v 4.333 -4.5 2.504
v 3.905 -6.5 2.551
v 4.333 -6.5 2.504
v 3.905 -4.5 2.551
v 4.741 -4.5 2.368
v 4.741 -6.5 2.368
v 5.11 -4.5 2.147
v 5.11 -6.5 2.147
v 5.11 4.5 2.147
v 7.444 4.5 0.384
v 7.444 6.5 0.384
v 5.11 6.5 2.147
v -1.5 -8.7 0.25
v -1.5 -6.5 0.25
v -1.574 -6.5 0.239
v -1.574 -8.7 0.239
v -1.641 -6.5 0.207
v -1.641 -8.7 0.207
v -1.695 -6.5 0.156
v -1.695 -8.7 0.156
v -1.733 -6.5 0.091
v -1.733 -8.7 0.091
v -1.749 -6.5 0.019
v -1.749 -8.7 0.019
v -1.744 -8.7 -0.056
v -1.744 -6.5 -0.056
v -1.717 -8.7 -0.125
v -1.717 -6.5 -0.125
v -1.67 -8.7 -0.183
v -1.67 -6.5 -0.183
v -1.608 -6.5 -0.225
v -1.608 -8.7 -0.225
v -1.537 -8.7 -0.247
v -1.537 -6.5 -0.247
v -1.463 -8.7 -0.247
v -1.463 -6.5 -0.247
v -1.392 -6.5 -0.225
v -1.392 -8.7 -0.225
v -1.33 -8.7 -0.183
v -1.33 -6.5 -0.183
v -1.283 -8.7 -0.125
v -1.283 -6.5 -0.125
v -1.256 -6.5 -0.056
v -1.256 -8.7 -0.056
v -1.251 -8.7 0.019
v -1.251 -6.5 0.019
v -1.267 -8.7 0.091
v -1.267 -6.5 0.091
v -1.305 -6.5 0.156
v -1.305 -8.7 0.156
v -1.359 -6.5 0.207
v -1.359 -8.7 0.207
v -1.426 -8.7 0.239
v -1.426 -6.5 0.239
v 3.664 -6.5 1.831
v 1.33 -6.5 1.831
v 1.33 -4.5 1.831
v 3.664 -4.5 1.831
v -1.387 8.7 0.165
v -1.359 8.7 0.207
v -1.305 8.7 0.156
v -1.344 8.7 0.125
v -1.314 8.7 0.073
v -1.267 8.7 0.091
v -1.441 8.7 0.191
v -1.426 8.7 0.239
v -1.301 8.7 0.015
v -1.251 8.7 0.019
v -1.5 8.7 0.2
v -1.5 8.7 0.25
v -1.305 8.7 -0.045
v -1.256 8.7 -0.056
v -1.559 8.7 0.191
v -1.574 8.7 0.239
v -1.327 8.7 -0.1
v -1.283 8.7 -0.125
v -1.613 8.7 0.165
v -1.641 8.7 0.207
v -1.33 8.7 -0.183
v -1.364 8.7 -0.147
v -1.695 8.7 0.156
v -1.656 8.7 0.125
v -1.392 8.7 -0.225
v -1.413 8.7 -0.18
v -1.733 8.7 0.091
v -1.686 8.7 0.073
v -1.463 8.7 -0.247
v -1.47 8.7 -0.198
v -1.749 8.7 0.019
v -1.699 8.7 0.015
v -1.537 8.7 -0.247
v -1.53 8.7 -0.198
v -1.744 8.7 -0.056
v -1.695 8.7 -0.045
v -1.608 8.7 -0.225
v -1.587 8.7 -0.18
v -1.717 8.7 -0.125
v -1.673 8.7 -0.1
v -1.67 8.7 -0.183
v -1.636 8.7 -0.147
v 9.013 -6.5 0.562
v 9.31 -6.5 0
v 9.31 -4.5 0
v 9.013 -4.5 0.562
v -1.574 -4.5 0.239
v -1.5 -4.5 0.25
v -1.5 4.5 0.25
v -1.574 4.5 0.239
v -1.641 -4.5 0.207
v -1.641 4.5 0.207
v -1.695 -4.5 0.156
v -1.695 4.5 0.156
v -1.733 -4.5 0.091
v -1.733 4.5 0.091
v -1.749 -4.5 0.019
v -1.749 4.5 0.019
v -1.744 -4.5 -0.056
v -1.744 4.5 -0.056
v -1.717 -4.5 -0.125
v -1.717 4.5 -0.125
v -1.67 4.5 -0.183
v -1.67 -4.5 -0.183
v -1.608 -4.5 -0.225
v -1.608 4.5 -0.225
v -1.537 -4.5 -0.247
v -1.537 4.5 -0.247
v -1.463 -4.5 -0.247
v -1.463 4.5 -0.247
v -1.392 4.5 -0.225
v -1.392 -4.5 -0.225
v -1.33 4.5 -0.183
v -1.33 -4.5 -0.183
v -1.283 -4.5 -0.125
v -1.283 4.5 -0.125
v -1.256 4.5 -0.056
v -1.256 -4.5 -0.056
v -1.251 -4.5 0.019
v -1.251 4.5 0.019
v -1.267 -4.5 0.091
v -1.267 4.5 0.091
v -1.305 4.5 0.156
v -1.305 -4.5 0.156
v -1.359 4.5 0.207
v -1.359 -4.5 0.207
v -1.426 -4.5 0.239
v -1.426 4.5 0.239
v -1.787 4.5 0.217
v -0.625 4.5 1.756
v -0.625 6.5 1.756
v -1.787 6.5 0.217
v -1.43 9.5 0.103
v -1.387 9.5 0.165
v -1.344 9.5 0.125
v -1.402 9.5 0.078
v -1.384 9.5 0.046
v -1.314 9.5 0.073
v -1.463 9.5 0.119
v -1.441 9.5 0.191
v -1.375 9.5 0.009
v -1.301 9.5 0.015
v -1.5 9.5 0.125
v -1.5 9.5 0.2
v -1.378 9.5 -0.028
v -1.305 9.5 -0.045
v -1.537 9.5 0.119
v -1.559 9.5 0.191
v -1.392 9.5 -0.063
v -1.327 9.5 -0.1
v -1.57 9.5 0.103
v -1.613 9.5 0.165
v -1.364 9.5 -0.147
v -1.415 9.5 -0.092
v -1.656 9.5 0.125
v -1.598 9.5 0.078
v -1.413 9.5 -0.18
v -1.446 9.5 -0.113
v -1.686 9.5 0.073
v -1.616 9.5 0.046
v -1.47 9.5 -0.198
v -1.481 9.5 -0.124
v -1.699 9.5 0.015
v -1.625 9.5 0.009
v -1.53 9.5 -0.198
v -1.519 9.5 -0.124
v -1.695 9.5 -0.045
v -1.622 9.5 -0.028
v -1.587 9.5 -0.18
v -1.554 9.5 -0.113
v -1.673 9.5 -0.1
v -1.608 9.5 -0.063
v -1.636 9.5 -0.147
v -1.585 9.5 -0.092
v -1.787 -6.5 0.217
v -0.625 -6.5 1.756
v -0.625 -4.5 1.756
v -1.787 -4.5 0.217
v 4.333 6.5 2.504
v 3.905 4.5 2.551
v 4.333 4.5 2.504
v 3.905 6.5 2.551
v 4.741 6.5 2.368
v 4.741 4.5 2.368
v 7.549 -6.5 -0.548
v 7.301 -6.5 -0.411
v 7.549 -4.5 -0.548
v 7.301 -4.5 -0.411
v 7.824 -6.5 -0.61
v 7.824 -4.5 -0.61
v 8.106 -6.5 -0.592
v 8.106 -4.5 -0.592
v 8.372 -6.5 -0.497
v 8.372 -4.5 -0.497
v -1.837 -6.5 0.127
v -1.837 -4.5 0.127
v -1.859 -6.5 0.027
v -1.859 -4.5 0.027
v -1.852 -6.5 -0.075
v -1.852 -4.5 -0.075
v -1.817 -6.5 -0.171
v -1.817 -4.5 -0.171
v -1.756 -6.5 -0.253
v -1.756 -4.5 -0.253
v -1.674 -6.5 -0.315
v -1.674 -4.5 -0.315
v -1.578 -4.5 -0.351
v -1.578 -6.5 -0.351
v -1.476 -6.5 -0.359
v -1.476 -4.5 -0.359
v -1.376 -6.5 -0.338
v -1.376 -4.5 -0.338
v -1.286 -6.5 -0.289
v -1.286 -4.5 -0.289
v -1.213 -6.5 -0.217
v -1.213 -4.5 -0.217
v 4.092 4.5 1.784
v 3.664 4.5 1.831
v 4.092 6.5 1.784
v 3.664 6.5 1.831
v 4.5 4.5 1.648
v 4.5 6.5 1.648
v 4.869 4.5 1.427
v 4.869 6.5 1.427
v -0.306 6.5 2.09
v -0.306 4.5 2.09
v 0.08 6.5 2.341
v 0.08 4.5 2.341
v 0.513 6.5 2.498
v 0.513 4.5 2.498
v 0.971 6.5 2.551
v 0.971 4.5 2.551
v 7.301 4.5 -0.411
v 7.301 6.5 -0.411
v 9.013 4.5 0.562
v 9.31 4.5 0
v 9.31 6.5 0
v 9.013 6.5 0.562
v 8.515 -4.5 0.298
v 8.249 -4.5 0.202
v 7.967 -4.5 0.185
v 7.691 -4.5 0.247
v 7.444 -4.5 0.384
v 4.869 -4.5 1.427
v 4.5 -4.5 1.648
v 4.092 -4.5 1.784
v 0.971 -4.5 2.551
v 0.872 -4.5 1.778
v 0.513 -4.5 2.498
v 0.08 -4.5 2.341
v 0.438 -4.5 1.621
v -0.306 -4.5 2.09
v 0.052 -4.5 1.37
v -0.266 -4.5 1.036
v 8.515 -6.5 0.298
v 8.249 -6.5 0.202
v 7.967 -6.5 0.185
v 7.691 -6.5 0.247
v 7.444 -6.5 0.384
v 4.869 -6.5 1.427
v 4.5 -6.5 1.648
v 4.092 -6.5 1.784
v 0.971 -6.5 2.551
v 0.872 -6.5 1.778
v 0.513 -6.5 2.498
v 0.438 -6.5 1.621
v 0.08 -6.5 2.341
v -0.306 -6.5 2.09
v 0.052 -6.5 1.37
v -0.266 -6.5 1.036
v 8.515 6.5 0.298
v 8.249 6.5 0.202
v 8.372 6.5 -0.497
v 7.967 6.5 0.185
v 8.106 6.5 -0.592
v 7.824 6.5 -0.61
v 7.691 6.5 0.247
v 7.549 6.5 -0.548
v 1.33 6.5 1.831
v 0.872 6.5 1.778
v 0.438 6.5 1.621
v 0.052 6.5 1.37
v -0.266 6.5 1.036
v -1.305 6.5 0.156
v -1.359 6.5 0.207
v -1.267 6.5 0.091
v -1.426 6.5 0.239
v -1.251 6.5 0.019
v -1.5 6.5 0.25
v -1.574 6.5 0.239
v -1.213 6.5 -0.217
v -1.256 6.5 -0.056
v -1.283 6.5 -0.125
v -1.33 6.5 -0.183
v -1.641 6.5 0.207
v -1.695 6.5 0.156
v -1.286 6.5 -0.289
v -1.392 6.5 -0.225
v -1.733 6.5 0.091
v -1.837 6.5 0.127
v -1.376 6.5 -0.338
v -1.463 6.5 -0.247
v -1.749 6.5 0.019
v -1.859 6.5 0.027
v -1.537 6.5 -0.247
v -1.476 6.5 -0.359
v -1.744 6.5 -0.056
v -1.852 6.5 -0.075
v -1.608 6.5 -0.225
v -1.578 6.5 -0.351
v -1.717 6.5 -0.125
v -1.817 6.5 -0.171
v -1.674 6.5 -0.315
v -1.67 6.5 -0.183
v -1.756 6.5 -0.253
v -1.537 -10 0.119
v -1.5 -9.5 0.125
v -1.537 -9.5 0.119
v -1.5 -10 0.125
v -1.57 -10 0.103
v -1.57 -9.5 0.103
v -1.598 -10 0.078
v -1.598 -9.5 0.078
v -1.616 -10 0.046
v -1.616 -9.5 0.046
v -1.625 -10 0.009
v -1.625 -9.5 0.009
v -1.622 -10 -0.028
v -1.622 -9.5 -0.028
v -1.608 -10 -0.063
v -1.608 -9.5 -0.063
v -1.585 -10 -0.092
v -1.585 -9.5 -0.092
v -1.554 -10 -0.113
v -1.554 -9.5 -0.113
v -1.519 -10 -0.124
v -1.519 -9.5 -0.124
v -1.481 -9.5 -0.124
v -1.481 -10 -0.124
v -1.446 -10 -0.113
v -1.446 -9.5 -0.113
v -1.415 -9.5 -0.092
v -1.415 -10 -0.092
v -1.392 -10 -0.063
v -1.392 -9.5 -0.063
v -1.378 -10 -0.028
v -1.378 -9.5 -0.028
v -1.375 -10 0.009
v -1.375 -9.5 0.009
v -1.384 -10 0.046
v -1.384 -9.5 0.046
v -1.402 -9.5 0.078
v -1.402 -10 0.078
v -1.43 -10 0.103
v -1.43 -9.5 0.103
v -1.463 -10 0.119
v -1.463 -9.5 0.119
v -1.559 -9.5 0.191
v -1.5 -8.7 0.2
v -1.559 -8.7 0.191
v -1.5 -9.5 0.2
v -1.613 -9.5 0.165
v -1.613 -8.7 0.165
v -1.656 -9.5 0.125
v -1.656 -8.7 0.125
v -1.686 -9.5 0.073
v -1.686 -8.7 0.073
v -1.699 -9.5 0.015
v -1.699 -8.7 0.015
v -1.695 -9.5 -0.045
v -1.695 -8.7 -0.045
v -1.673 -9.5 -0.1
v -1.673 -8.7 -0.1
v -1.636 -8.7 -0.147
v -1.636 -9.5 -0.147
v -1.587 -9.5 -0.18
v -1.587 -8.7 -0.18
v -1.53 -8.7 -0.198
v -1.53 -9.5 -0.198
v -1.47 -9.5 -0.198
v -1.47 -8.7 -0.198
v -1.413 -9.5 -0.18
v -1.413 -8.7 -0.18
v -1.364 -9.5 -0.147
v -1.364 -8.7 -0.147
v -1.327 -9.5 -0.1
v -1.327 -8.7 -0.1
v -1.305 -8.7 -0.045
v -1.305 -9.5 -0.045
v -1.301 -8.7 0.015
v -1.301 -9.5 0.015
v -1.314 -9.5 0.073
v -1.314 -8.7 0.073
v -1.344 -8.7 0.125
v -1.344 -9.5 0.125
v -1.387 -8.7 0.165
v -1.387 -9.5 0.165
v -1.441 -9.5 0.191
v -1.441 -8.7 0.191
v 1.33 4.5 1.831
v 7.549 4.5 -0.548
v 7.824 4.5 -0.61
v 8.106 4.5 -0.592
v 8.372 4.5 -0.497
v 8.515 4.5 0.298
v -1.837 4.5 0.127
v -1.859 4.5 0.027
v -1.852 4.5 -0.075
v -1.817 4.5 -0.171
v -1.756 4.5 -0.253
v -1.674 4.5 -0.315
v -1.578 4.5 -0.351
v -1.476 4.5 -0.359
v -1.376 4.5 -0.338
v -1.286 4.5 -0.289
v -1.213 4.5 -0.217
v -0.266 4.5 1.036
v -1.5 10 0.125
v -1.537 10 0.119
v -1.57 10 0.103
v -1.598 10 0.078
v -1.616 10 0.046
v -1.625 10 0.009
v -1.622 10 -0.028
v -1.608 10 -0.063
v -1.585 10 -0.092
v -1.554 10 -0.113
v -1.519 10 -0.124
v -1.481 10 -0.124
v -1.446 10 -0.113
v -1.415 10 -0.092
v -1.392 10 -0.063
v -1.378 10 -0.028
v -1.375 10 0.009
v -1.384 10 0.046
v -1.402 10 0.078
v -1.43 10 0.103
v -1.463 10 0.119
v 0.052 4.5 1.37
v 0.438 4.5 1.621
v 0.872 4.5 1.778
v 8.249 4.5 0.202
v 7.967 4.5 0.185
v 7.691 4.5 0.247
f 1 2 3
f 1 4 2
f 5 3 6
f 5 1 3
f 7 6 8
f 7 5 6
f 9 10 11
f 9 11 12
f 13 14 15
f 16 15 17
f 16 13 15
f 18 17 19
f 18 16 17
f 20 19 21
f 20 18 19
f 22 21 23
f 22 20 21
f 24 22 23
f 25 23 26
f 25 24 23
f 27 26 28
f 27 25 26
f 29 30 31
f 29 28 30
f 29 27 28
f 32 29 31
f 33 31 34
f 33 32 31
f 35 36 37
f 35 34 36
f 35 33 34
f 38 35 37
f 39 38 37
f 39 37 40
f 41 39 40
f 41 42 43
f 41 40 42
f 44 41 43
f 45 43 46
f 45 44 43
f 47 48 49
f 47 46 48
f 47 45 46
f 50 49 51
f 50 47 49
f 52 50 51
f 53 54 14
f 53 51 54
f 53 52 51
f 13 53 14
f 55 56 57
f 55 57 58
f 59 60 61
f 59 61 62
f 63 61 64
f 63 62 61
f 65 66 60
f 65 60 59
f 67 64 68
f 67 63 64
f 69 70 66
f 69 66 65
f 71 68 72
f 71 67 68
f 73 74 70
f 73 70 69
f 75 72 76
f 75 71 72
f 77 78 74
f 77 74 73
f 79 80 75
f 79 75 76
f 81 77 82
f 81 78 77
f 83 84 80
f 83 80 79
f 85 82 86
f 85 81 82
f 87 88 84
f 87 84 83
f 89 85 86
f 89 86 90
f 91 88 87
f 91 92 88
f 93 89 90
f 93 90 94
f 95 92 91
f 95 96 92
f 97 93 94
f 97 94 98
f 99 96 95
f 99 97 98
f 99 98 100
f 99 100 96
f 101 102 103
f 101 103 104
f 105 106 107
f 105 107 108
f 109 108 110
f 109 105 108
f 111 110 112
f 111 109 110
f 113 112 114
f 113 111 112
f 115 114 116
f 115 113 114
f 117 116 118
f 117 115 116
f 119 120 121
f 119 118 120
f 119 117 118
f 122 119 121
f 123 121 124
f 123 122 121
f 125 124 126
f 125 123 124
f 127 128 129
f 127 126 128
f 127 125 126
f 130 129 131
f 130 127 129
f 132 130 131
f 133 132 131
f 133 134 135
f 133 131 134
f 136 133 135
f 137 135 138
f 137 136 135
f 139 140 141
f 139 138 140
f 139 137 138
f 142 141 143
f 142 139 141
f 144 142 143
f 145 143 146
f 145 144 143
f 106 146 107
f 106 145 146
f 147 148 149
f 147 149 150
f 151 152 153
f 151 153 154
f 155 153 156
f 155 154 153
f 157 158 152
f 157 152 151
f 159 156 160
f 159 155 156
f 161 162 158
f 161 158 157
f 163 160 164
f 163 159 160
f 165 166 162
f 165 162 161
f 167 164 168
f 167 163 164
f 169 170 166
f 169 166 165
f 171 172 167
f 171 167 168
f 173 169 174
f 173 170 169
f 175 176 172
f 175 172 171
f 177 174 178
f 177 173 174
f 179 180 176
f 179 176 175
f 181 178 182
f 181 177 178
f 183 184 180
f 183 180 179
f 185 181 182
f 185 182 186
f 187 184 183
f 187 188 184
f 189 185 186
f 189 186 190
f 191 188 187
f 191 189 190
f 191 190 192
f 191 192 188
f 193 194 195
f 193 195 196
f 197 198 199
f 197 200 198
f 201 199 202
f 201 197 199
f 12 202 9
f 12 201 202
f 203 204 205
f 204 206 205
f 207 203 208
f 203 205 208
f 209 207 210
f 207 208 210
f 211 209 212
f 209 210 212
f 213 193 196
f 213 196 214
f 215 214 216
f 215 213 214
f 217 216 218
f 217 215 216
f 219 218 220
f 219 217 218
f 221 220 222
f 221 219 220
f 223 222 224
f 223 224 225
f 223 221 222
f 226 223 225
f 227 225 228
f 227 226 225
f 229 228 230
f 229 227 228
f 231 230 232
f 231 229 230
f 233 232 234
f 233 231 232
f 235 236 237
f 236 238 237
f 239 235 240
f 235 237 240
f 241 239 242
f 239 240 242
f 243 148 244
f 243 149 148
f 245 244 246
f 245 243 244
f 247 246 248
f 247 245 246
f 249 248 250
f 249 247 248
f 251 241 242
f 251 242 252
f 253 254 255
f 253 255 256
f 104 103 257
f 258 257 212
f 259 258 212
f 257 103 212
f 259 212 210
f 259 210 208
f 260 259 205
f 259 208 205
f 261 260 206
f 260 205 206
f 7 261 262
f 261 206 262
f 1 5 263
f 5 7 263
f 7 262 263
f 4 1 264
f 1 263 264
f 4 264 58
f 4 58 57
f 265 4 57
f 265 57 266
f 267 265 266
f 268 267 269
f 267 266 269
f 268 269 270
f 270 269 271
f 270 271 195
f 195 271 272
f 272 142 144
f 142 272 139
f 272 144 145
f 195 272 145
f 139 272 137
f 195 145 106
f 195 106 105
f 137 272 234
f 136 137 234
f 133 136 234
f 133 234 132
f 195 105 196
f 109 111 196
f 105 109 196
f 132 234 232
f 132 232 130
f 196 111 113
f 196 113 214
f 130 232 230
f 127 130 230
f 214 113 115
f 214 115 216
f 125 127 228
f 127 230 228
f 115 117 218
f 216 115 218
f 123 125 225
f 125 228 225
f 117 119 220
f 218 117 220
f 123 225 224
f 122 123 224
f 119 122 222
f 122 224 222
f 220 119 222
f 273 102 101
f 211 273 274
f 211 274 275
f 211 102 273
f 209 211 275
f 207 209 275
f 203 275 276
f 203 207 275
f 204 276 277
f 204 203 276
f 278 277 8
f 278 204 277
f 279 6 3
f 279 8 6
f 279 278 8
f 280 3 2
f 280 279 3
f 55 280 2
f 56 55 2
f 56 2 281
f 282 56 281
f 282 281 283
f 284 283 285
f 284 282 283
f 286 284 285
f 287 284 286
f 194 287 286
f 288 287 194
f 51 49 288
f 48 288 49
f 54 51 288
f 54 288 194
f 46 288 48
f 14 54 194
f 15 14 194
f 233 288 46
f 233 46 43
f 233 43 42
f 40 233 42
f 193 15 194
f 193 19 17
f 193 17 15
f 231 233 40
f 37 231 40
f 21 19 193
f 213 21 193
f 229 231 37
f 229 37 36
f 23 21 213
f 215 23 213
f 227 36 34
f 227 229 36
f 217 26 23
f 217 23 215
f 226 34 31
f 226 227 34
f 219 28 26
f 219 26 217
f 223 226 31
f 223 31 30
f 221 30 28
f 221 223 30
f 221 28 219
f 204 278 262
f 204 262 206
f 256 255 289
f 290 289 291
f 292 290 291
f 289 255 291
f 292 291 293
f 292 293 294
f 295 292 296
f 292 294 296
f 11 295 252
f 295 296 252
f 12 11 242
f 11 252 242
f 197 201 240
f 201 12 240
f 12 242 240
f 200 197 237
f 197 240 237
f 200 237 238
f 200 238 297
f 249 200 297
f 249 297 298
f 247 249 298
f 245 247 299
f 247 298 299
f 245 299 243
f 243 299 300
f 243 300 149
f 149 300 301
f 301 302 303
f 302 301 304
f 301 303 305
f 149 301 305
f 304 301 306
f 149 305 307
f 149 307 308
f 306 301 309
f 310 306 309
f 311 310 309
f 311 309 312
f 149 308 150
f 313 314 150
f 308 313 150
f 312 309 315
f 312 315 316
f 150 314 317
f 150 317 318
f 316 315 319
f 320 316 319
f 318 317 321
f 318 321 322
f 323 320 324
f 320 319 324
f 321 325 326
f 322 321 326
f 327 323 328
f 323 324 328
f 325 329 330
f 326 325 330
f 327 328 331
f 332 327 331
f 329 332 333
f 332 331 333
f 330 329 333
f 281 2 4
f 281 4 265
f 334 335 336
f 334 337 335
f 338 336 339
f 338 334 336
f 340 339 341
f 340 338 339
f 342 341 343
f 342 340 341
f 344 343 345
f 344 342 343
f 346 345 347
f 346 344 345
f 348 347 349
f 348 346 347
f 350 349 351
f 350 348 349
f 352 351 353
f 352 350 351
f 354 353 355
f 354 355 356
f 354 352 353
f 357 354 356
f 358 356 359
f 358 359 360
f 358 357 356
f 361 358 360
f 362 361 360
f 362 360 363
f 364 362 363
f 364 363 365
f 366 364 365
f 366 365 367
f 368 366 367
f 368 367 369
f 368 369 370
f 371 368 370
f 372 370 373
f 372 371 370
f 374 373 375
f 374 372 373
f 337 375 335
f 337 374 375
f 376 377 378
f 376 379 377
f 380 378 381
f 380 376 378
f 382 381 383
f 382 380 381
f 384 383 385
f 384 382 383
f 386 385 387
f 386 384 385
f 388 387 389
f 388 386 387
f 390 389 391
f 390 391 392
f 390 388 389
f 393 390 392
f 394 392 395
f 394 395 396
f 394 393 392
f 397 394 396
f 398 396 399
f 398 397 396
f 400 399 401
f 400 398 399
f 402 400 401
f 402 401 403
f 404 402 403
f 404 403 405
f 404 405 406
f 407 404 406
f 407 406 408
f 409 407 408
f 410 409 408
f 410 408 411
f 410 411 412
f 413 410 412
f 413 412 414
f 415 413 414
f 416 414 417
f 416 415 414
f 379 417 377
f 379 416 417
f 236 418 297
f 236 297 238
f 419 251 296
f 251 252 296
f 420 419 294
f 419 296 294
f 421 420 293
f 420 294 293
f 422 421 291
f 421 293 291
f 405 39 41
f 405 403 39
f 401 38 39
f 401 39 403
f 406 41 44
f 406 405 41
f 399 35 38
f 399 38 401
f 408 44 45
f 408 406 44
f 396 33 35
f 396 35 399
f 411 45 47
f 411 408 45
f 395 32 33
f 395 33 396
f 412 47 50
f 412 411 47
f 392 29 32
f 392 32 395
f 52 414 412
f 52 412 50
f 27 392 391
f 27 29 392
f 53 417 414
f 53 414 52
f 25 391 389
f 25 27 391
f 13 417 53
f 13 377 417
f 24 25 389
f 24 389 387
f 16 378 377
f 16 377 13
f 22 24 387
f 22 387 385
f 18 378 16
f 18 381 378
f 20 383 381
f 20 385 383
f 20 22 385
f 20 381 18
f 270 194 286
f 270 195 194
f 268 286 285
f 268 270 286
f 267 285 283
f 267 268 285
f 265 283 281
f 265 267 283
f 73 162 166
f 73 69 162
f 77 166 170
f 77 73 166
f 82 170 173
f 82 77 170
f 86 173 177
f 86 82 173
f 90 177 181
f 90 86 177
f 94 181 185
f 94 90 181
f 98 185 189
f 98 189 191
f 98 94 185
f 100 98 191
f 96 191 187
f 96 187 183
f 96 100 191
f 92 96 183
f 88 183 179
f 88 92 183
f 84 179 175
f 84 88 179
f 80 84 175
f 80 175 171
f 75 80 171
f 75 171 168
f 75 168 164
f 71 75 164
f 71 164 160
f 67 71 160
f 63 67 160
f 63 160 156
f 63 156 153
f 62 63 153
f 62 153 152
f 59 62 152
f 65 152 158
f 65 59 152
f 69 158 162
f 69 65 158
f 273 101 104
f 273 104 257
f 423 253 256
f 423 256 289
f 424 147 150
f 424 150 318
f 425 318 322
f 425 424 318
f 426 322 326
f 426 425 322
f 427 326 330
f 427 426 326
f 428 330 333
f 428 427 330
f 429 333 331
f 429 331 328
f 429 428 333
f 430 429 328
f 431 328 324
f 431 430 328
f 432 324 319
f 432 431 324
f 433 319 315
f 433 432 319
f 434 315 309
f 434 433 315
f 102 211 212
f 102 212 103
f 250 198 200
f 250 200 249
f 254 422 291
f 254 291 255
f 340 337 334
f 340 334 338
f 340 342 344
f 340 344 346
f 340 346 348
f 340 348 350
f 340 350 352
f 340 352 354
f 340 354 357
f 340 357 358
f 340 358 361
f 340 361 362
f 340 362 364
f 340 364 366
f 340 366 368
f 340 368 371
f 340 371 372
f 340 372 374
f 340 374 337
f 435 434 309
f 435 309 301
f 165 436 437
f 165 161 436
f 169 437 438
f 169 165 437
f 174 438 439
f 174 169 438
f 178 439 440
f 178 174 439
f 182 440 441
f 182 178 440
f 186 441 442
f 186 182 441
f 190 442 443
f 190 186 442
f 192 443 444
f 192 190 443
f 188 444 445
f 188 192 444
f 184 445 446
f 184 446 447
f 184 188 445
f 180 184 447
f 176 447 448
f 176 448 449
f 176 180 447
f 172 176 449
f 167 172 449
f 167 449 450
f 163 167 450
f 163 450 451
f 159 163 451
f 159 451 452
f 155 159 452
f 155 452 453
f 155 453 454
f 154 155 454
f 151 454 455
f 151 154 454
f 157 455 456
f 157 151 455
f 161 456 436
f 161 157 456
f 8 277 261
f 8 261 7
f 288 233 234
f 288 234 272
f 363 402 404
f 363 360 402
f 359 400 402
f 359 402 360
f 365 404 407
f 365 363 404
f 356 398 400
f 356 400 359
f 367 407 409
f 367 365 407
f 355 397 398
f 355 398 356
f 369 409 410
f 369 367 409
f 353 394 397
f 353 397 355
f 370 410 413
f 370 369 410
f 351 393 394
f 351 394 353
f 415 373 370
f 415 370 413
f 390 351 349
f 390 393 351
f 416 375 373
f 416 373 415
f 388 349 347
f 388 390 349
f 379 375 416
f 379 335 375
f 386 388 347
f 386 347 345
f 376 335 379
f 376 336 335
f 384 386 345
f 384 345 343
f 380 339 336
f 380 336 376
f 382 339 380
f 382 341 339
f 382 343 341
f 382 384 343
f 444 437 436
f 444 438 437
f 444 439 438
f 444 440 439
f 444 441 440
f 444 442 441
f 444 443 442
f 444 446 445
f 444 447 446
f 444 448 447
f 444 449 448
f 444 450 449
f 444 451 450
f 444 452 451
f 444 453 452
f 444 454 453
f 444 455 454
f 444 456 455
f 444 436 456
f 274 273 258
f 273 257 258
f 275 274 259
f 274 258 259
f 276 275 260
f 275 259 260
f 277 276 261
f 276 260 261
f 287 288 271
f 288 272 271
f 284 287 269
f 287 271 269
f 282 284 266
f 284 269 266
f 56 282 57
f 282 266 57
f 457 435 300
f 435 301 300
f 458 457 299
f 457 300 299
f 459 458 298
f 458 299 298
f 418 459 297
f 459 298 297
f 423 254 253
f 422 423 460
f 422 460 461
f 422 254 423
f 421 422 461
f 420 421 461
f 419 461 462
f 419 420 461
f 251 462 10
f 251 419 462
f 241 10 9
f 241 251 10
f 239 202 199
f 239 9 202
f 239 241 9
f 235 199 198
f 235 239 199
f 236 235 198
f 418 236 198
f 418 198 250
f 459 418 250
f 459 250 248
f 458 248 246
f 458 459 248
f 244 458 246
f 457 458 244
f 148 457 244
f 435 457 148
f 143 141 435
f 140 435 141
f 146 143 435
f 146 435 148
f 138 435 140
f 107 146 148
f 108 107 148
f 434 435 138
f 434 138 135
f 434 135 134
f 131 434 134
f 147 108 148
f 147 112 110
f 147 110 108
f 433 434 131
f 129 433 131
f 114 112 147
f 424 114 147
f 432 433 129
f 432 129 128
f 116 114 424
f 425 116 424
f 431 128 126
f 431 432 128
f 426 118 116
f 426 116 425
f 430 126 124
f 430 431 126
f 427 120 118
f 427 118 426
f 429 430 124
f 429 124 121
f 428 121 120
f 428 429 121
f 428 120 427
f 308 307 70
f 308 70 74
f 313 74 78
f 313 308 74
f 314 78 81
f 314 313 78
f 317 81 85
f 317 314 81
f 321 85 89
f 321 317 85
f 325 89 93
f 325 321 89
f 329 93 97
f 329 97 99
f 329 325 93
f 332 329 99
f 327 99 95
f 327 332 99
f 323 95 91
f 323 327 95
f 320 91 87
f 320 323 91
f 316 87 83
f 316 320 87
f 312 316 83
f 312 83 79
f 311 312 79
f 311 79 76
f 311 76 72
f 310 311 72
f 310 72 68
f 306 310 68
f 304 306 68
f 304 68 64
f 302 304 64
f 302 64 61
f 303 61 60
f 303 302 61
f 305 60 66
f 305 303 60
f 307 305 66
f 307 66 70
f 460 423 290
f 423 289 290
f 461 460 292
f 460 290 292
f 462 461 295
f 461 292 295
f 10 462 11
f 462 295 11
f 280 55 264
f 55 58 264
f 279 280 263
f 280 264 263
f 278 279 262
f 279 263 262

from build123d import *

# Parameters (mm, degrees)
BOSS_EXTRUDE1_START = 4.5
SKETCH2_R           = 0.25
BOSS_EXTRUDE1_DEPTH = 2
BOSS_EXTRUDE2_START = -6.5
SKETCH2_2_R         = 0.25
BOSS_EXTRUDE2_DEPTH = 2
FILLET1_R           = 2
FILLET2_R           = 2
FILLET3_R           = 1
FILLET4_R           = 1


with BuildPart() as part:
    # Sketch1 → Revolve1 (revolve)
    with BuildSketch(Plane.XY):
        Polygon((-1.75, 8.7), (-1.75, -8.7), (-1.7, -8.7), (-1.7, -9.5), (-1.625, -9.5), (-1.625, -10), (-1.5, -10), (-1.5, 10), (-1.625, 10), (-1.625, 9.5), (-1.7, 9.5), (-1.7, 8.7), align=None)
    revolve(axis=Axis((-1.5, 10, 0), (0, -1, 0)))

    # Sketch2 → Boss-Extrude1 (add)
    with BuildSketch(Plane(origin=(0, 0, 0), x_dir=(1, 0, 0), z_dir=(0, 1, 0)).offset(BOSS_EXTRUDE1_START)):
        with BuildLine():
            Line((-1.212744122, 0.216988619), (0.334063036, -1.830719917))
            Line((0.334063036, -1.830719917), (4.334063036, -1.830719917))
            Line((4.334063036, -1.830719917), (7.809461076, 0.794541672))
            Line((7.809461076, 0.794541672), (9.31, 0))
            Line((9.31, 0), (9.012661236, -0.561541836))
            Line((9.012661236, -0.561541836), (7.952156278, 0))
            Line((7.952156278, 0), (4.575438683, -2.550719917))
            Line((4.575438683, -2.550719917), (-0.024391576, -2.550719917))
            Line((-0.024391576, -2.550719917), (-1.787255878, -0.216988619))
            ThreePointArc((-1.787255878, -0.216988619), (-1.716988619, 0.287255878), (-1.212744122, 0.216988619))
        make_face()
        with Locations((-1.5, 0)):
            Circle(SKETCH2_R, mode=Mode.SUBTRACT)
    extrude(amount=BOSS_EXTRUDE1_DEPTH)

    # Sketch2<2> → Boss-Extrude2 (add)
    with BuildSketch(Plane(origin=(0, 0, 0), x_dir=(1, 0, 0), z_dir=(0, 1, 0)).offset(BOSS_EXTRUDE2_START)):
        with BuildLine():
            Line((-1.212744122, 0.216988619), (0.334063036, -1.830719917))
            Line((0.334063036, -1.830719917), (4.334063036, -1.830719917))
            Line((4.334063036, -1.830719917), (7.809461076, 0.794541672))
            Line((7.809461076, 0.794541672), (9.31, 0))
            Line((9.31, 0), (9.012661236, -0.561541836))
            Line((9.012661236, -0.561541836), (7.952156278, 0))
            Line((7.952156278, 0), (4.575438683, -2.550719917))
            Line((4.575438683, -2.550719917), (-0.024391576, -2.550719917))
            Line((-0.024391576, -2.550719917), (-1.787255878, -0.216988619))
            ThreePointArc((-1.787255878, -0.216988619), (-1.716988619, 0.287255878), (-1.212744122, 0.216988619))
        make_face()
        with Locations((-1.5, 0)):
            Circle(SKETCH2_2_R, mode=Mode.SUBTRACT)
    extrude(amount=BOSS_EXTRUDE2_DEPTH)

    # Fillet1
    fillet1_edges = [part.edges().sort_by_distance(p)[0] for p in [
        (4.334063036, 5.5, 1.830719917),
        (4.334063036, -5.5, 1.830719917),
        (0.334063036, 5.5, 1.830719917),
        (0.334063036, -5.5, 1.830719917),
    ]]
    fillet(fillet1_edges, radius=FILLET1_R)

    # Fillet2
    fillet2_edges = [part.edges().sort_by_distance(p)[0] for p in [
        (4.575438683, -5.5, 2.550719917),
        (-0.024391576, -5.5, 2.550719917),
        (4.575438683, 5.5, 2.550719917),
        (-0.024391576, 5.5, 2.550719917),
    ]]
    fillet(fillet2_edges, radius=FILLET2_R)

    # Fillet3
    fillet3_edges = [part.edges().sort_by_distance(p)[0] for p in [
        (7.809461076, 5.5, -0.794541672),
        (7.809461076, -5.5, -0.794541672),
    ]]
    fillet(fillet3_edges, radius=FILLET3_R)

    # Fillet4
    fillet4_edges = [part.edges().sort_by_distance(p)[0] for p in [
        (7.952156278, -5.5, 0),
        (7.952156278, 5.5, 0),
    ]]
    fillet(fillet4_edges, radius=FILLET4_R)


solid = part.part
